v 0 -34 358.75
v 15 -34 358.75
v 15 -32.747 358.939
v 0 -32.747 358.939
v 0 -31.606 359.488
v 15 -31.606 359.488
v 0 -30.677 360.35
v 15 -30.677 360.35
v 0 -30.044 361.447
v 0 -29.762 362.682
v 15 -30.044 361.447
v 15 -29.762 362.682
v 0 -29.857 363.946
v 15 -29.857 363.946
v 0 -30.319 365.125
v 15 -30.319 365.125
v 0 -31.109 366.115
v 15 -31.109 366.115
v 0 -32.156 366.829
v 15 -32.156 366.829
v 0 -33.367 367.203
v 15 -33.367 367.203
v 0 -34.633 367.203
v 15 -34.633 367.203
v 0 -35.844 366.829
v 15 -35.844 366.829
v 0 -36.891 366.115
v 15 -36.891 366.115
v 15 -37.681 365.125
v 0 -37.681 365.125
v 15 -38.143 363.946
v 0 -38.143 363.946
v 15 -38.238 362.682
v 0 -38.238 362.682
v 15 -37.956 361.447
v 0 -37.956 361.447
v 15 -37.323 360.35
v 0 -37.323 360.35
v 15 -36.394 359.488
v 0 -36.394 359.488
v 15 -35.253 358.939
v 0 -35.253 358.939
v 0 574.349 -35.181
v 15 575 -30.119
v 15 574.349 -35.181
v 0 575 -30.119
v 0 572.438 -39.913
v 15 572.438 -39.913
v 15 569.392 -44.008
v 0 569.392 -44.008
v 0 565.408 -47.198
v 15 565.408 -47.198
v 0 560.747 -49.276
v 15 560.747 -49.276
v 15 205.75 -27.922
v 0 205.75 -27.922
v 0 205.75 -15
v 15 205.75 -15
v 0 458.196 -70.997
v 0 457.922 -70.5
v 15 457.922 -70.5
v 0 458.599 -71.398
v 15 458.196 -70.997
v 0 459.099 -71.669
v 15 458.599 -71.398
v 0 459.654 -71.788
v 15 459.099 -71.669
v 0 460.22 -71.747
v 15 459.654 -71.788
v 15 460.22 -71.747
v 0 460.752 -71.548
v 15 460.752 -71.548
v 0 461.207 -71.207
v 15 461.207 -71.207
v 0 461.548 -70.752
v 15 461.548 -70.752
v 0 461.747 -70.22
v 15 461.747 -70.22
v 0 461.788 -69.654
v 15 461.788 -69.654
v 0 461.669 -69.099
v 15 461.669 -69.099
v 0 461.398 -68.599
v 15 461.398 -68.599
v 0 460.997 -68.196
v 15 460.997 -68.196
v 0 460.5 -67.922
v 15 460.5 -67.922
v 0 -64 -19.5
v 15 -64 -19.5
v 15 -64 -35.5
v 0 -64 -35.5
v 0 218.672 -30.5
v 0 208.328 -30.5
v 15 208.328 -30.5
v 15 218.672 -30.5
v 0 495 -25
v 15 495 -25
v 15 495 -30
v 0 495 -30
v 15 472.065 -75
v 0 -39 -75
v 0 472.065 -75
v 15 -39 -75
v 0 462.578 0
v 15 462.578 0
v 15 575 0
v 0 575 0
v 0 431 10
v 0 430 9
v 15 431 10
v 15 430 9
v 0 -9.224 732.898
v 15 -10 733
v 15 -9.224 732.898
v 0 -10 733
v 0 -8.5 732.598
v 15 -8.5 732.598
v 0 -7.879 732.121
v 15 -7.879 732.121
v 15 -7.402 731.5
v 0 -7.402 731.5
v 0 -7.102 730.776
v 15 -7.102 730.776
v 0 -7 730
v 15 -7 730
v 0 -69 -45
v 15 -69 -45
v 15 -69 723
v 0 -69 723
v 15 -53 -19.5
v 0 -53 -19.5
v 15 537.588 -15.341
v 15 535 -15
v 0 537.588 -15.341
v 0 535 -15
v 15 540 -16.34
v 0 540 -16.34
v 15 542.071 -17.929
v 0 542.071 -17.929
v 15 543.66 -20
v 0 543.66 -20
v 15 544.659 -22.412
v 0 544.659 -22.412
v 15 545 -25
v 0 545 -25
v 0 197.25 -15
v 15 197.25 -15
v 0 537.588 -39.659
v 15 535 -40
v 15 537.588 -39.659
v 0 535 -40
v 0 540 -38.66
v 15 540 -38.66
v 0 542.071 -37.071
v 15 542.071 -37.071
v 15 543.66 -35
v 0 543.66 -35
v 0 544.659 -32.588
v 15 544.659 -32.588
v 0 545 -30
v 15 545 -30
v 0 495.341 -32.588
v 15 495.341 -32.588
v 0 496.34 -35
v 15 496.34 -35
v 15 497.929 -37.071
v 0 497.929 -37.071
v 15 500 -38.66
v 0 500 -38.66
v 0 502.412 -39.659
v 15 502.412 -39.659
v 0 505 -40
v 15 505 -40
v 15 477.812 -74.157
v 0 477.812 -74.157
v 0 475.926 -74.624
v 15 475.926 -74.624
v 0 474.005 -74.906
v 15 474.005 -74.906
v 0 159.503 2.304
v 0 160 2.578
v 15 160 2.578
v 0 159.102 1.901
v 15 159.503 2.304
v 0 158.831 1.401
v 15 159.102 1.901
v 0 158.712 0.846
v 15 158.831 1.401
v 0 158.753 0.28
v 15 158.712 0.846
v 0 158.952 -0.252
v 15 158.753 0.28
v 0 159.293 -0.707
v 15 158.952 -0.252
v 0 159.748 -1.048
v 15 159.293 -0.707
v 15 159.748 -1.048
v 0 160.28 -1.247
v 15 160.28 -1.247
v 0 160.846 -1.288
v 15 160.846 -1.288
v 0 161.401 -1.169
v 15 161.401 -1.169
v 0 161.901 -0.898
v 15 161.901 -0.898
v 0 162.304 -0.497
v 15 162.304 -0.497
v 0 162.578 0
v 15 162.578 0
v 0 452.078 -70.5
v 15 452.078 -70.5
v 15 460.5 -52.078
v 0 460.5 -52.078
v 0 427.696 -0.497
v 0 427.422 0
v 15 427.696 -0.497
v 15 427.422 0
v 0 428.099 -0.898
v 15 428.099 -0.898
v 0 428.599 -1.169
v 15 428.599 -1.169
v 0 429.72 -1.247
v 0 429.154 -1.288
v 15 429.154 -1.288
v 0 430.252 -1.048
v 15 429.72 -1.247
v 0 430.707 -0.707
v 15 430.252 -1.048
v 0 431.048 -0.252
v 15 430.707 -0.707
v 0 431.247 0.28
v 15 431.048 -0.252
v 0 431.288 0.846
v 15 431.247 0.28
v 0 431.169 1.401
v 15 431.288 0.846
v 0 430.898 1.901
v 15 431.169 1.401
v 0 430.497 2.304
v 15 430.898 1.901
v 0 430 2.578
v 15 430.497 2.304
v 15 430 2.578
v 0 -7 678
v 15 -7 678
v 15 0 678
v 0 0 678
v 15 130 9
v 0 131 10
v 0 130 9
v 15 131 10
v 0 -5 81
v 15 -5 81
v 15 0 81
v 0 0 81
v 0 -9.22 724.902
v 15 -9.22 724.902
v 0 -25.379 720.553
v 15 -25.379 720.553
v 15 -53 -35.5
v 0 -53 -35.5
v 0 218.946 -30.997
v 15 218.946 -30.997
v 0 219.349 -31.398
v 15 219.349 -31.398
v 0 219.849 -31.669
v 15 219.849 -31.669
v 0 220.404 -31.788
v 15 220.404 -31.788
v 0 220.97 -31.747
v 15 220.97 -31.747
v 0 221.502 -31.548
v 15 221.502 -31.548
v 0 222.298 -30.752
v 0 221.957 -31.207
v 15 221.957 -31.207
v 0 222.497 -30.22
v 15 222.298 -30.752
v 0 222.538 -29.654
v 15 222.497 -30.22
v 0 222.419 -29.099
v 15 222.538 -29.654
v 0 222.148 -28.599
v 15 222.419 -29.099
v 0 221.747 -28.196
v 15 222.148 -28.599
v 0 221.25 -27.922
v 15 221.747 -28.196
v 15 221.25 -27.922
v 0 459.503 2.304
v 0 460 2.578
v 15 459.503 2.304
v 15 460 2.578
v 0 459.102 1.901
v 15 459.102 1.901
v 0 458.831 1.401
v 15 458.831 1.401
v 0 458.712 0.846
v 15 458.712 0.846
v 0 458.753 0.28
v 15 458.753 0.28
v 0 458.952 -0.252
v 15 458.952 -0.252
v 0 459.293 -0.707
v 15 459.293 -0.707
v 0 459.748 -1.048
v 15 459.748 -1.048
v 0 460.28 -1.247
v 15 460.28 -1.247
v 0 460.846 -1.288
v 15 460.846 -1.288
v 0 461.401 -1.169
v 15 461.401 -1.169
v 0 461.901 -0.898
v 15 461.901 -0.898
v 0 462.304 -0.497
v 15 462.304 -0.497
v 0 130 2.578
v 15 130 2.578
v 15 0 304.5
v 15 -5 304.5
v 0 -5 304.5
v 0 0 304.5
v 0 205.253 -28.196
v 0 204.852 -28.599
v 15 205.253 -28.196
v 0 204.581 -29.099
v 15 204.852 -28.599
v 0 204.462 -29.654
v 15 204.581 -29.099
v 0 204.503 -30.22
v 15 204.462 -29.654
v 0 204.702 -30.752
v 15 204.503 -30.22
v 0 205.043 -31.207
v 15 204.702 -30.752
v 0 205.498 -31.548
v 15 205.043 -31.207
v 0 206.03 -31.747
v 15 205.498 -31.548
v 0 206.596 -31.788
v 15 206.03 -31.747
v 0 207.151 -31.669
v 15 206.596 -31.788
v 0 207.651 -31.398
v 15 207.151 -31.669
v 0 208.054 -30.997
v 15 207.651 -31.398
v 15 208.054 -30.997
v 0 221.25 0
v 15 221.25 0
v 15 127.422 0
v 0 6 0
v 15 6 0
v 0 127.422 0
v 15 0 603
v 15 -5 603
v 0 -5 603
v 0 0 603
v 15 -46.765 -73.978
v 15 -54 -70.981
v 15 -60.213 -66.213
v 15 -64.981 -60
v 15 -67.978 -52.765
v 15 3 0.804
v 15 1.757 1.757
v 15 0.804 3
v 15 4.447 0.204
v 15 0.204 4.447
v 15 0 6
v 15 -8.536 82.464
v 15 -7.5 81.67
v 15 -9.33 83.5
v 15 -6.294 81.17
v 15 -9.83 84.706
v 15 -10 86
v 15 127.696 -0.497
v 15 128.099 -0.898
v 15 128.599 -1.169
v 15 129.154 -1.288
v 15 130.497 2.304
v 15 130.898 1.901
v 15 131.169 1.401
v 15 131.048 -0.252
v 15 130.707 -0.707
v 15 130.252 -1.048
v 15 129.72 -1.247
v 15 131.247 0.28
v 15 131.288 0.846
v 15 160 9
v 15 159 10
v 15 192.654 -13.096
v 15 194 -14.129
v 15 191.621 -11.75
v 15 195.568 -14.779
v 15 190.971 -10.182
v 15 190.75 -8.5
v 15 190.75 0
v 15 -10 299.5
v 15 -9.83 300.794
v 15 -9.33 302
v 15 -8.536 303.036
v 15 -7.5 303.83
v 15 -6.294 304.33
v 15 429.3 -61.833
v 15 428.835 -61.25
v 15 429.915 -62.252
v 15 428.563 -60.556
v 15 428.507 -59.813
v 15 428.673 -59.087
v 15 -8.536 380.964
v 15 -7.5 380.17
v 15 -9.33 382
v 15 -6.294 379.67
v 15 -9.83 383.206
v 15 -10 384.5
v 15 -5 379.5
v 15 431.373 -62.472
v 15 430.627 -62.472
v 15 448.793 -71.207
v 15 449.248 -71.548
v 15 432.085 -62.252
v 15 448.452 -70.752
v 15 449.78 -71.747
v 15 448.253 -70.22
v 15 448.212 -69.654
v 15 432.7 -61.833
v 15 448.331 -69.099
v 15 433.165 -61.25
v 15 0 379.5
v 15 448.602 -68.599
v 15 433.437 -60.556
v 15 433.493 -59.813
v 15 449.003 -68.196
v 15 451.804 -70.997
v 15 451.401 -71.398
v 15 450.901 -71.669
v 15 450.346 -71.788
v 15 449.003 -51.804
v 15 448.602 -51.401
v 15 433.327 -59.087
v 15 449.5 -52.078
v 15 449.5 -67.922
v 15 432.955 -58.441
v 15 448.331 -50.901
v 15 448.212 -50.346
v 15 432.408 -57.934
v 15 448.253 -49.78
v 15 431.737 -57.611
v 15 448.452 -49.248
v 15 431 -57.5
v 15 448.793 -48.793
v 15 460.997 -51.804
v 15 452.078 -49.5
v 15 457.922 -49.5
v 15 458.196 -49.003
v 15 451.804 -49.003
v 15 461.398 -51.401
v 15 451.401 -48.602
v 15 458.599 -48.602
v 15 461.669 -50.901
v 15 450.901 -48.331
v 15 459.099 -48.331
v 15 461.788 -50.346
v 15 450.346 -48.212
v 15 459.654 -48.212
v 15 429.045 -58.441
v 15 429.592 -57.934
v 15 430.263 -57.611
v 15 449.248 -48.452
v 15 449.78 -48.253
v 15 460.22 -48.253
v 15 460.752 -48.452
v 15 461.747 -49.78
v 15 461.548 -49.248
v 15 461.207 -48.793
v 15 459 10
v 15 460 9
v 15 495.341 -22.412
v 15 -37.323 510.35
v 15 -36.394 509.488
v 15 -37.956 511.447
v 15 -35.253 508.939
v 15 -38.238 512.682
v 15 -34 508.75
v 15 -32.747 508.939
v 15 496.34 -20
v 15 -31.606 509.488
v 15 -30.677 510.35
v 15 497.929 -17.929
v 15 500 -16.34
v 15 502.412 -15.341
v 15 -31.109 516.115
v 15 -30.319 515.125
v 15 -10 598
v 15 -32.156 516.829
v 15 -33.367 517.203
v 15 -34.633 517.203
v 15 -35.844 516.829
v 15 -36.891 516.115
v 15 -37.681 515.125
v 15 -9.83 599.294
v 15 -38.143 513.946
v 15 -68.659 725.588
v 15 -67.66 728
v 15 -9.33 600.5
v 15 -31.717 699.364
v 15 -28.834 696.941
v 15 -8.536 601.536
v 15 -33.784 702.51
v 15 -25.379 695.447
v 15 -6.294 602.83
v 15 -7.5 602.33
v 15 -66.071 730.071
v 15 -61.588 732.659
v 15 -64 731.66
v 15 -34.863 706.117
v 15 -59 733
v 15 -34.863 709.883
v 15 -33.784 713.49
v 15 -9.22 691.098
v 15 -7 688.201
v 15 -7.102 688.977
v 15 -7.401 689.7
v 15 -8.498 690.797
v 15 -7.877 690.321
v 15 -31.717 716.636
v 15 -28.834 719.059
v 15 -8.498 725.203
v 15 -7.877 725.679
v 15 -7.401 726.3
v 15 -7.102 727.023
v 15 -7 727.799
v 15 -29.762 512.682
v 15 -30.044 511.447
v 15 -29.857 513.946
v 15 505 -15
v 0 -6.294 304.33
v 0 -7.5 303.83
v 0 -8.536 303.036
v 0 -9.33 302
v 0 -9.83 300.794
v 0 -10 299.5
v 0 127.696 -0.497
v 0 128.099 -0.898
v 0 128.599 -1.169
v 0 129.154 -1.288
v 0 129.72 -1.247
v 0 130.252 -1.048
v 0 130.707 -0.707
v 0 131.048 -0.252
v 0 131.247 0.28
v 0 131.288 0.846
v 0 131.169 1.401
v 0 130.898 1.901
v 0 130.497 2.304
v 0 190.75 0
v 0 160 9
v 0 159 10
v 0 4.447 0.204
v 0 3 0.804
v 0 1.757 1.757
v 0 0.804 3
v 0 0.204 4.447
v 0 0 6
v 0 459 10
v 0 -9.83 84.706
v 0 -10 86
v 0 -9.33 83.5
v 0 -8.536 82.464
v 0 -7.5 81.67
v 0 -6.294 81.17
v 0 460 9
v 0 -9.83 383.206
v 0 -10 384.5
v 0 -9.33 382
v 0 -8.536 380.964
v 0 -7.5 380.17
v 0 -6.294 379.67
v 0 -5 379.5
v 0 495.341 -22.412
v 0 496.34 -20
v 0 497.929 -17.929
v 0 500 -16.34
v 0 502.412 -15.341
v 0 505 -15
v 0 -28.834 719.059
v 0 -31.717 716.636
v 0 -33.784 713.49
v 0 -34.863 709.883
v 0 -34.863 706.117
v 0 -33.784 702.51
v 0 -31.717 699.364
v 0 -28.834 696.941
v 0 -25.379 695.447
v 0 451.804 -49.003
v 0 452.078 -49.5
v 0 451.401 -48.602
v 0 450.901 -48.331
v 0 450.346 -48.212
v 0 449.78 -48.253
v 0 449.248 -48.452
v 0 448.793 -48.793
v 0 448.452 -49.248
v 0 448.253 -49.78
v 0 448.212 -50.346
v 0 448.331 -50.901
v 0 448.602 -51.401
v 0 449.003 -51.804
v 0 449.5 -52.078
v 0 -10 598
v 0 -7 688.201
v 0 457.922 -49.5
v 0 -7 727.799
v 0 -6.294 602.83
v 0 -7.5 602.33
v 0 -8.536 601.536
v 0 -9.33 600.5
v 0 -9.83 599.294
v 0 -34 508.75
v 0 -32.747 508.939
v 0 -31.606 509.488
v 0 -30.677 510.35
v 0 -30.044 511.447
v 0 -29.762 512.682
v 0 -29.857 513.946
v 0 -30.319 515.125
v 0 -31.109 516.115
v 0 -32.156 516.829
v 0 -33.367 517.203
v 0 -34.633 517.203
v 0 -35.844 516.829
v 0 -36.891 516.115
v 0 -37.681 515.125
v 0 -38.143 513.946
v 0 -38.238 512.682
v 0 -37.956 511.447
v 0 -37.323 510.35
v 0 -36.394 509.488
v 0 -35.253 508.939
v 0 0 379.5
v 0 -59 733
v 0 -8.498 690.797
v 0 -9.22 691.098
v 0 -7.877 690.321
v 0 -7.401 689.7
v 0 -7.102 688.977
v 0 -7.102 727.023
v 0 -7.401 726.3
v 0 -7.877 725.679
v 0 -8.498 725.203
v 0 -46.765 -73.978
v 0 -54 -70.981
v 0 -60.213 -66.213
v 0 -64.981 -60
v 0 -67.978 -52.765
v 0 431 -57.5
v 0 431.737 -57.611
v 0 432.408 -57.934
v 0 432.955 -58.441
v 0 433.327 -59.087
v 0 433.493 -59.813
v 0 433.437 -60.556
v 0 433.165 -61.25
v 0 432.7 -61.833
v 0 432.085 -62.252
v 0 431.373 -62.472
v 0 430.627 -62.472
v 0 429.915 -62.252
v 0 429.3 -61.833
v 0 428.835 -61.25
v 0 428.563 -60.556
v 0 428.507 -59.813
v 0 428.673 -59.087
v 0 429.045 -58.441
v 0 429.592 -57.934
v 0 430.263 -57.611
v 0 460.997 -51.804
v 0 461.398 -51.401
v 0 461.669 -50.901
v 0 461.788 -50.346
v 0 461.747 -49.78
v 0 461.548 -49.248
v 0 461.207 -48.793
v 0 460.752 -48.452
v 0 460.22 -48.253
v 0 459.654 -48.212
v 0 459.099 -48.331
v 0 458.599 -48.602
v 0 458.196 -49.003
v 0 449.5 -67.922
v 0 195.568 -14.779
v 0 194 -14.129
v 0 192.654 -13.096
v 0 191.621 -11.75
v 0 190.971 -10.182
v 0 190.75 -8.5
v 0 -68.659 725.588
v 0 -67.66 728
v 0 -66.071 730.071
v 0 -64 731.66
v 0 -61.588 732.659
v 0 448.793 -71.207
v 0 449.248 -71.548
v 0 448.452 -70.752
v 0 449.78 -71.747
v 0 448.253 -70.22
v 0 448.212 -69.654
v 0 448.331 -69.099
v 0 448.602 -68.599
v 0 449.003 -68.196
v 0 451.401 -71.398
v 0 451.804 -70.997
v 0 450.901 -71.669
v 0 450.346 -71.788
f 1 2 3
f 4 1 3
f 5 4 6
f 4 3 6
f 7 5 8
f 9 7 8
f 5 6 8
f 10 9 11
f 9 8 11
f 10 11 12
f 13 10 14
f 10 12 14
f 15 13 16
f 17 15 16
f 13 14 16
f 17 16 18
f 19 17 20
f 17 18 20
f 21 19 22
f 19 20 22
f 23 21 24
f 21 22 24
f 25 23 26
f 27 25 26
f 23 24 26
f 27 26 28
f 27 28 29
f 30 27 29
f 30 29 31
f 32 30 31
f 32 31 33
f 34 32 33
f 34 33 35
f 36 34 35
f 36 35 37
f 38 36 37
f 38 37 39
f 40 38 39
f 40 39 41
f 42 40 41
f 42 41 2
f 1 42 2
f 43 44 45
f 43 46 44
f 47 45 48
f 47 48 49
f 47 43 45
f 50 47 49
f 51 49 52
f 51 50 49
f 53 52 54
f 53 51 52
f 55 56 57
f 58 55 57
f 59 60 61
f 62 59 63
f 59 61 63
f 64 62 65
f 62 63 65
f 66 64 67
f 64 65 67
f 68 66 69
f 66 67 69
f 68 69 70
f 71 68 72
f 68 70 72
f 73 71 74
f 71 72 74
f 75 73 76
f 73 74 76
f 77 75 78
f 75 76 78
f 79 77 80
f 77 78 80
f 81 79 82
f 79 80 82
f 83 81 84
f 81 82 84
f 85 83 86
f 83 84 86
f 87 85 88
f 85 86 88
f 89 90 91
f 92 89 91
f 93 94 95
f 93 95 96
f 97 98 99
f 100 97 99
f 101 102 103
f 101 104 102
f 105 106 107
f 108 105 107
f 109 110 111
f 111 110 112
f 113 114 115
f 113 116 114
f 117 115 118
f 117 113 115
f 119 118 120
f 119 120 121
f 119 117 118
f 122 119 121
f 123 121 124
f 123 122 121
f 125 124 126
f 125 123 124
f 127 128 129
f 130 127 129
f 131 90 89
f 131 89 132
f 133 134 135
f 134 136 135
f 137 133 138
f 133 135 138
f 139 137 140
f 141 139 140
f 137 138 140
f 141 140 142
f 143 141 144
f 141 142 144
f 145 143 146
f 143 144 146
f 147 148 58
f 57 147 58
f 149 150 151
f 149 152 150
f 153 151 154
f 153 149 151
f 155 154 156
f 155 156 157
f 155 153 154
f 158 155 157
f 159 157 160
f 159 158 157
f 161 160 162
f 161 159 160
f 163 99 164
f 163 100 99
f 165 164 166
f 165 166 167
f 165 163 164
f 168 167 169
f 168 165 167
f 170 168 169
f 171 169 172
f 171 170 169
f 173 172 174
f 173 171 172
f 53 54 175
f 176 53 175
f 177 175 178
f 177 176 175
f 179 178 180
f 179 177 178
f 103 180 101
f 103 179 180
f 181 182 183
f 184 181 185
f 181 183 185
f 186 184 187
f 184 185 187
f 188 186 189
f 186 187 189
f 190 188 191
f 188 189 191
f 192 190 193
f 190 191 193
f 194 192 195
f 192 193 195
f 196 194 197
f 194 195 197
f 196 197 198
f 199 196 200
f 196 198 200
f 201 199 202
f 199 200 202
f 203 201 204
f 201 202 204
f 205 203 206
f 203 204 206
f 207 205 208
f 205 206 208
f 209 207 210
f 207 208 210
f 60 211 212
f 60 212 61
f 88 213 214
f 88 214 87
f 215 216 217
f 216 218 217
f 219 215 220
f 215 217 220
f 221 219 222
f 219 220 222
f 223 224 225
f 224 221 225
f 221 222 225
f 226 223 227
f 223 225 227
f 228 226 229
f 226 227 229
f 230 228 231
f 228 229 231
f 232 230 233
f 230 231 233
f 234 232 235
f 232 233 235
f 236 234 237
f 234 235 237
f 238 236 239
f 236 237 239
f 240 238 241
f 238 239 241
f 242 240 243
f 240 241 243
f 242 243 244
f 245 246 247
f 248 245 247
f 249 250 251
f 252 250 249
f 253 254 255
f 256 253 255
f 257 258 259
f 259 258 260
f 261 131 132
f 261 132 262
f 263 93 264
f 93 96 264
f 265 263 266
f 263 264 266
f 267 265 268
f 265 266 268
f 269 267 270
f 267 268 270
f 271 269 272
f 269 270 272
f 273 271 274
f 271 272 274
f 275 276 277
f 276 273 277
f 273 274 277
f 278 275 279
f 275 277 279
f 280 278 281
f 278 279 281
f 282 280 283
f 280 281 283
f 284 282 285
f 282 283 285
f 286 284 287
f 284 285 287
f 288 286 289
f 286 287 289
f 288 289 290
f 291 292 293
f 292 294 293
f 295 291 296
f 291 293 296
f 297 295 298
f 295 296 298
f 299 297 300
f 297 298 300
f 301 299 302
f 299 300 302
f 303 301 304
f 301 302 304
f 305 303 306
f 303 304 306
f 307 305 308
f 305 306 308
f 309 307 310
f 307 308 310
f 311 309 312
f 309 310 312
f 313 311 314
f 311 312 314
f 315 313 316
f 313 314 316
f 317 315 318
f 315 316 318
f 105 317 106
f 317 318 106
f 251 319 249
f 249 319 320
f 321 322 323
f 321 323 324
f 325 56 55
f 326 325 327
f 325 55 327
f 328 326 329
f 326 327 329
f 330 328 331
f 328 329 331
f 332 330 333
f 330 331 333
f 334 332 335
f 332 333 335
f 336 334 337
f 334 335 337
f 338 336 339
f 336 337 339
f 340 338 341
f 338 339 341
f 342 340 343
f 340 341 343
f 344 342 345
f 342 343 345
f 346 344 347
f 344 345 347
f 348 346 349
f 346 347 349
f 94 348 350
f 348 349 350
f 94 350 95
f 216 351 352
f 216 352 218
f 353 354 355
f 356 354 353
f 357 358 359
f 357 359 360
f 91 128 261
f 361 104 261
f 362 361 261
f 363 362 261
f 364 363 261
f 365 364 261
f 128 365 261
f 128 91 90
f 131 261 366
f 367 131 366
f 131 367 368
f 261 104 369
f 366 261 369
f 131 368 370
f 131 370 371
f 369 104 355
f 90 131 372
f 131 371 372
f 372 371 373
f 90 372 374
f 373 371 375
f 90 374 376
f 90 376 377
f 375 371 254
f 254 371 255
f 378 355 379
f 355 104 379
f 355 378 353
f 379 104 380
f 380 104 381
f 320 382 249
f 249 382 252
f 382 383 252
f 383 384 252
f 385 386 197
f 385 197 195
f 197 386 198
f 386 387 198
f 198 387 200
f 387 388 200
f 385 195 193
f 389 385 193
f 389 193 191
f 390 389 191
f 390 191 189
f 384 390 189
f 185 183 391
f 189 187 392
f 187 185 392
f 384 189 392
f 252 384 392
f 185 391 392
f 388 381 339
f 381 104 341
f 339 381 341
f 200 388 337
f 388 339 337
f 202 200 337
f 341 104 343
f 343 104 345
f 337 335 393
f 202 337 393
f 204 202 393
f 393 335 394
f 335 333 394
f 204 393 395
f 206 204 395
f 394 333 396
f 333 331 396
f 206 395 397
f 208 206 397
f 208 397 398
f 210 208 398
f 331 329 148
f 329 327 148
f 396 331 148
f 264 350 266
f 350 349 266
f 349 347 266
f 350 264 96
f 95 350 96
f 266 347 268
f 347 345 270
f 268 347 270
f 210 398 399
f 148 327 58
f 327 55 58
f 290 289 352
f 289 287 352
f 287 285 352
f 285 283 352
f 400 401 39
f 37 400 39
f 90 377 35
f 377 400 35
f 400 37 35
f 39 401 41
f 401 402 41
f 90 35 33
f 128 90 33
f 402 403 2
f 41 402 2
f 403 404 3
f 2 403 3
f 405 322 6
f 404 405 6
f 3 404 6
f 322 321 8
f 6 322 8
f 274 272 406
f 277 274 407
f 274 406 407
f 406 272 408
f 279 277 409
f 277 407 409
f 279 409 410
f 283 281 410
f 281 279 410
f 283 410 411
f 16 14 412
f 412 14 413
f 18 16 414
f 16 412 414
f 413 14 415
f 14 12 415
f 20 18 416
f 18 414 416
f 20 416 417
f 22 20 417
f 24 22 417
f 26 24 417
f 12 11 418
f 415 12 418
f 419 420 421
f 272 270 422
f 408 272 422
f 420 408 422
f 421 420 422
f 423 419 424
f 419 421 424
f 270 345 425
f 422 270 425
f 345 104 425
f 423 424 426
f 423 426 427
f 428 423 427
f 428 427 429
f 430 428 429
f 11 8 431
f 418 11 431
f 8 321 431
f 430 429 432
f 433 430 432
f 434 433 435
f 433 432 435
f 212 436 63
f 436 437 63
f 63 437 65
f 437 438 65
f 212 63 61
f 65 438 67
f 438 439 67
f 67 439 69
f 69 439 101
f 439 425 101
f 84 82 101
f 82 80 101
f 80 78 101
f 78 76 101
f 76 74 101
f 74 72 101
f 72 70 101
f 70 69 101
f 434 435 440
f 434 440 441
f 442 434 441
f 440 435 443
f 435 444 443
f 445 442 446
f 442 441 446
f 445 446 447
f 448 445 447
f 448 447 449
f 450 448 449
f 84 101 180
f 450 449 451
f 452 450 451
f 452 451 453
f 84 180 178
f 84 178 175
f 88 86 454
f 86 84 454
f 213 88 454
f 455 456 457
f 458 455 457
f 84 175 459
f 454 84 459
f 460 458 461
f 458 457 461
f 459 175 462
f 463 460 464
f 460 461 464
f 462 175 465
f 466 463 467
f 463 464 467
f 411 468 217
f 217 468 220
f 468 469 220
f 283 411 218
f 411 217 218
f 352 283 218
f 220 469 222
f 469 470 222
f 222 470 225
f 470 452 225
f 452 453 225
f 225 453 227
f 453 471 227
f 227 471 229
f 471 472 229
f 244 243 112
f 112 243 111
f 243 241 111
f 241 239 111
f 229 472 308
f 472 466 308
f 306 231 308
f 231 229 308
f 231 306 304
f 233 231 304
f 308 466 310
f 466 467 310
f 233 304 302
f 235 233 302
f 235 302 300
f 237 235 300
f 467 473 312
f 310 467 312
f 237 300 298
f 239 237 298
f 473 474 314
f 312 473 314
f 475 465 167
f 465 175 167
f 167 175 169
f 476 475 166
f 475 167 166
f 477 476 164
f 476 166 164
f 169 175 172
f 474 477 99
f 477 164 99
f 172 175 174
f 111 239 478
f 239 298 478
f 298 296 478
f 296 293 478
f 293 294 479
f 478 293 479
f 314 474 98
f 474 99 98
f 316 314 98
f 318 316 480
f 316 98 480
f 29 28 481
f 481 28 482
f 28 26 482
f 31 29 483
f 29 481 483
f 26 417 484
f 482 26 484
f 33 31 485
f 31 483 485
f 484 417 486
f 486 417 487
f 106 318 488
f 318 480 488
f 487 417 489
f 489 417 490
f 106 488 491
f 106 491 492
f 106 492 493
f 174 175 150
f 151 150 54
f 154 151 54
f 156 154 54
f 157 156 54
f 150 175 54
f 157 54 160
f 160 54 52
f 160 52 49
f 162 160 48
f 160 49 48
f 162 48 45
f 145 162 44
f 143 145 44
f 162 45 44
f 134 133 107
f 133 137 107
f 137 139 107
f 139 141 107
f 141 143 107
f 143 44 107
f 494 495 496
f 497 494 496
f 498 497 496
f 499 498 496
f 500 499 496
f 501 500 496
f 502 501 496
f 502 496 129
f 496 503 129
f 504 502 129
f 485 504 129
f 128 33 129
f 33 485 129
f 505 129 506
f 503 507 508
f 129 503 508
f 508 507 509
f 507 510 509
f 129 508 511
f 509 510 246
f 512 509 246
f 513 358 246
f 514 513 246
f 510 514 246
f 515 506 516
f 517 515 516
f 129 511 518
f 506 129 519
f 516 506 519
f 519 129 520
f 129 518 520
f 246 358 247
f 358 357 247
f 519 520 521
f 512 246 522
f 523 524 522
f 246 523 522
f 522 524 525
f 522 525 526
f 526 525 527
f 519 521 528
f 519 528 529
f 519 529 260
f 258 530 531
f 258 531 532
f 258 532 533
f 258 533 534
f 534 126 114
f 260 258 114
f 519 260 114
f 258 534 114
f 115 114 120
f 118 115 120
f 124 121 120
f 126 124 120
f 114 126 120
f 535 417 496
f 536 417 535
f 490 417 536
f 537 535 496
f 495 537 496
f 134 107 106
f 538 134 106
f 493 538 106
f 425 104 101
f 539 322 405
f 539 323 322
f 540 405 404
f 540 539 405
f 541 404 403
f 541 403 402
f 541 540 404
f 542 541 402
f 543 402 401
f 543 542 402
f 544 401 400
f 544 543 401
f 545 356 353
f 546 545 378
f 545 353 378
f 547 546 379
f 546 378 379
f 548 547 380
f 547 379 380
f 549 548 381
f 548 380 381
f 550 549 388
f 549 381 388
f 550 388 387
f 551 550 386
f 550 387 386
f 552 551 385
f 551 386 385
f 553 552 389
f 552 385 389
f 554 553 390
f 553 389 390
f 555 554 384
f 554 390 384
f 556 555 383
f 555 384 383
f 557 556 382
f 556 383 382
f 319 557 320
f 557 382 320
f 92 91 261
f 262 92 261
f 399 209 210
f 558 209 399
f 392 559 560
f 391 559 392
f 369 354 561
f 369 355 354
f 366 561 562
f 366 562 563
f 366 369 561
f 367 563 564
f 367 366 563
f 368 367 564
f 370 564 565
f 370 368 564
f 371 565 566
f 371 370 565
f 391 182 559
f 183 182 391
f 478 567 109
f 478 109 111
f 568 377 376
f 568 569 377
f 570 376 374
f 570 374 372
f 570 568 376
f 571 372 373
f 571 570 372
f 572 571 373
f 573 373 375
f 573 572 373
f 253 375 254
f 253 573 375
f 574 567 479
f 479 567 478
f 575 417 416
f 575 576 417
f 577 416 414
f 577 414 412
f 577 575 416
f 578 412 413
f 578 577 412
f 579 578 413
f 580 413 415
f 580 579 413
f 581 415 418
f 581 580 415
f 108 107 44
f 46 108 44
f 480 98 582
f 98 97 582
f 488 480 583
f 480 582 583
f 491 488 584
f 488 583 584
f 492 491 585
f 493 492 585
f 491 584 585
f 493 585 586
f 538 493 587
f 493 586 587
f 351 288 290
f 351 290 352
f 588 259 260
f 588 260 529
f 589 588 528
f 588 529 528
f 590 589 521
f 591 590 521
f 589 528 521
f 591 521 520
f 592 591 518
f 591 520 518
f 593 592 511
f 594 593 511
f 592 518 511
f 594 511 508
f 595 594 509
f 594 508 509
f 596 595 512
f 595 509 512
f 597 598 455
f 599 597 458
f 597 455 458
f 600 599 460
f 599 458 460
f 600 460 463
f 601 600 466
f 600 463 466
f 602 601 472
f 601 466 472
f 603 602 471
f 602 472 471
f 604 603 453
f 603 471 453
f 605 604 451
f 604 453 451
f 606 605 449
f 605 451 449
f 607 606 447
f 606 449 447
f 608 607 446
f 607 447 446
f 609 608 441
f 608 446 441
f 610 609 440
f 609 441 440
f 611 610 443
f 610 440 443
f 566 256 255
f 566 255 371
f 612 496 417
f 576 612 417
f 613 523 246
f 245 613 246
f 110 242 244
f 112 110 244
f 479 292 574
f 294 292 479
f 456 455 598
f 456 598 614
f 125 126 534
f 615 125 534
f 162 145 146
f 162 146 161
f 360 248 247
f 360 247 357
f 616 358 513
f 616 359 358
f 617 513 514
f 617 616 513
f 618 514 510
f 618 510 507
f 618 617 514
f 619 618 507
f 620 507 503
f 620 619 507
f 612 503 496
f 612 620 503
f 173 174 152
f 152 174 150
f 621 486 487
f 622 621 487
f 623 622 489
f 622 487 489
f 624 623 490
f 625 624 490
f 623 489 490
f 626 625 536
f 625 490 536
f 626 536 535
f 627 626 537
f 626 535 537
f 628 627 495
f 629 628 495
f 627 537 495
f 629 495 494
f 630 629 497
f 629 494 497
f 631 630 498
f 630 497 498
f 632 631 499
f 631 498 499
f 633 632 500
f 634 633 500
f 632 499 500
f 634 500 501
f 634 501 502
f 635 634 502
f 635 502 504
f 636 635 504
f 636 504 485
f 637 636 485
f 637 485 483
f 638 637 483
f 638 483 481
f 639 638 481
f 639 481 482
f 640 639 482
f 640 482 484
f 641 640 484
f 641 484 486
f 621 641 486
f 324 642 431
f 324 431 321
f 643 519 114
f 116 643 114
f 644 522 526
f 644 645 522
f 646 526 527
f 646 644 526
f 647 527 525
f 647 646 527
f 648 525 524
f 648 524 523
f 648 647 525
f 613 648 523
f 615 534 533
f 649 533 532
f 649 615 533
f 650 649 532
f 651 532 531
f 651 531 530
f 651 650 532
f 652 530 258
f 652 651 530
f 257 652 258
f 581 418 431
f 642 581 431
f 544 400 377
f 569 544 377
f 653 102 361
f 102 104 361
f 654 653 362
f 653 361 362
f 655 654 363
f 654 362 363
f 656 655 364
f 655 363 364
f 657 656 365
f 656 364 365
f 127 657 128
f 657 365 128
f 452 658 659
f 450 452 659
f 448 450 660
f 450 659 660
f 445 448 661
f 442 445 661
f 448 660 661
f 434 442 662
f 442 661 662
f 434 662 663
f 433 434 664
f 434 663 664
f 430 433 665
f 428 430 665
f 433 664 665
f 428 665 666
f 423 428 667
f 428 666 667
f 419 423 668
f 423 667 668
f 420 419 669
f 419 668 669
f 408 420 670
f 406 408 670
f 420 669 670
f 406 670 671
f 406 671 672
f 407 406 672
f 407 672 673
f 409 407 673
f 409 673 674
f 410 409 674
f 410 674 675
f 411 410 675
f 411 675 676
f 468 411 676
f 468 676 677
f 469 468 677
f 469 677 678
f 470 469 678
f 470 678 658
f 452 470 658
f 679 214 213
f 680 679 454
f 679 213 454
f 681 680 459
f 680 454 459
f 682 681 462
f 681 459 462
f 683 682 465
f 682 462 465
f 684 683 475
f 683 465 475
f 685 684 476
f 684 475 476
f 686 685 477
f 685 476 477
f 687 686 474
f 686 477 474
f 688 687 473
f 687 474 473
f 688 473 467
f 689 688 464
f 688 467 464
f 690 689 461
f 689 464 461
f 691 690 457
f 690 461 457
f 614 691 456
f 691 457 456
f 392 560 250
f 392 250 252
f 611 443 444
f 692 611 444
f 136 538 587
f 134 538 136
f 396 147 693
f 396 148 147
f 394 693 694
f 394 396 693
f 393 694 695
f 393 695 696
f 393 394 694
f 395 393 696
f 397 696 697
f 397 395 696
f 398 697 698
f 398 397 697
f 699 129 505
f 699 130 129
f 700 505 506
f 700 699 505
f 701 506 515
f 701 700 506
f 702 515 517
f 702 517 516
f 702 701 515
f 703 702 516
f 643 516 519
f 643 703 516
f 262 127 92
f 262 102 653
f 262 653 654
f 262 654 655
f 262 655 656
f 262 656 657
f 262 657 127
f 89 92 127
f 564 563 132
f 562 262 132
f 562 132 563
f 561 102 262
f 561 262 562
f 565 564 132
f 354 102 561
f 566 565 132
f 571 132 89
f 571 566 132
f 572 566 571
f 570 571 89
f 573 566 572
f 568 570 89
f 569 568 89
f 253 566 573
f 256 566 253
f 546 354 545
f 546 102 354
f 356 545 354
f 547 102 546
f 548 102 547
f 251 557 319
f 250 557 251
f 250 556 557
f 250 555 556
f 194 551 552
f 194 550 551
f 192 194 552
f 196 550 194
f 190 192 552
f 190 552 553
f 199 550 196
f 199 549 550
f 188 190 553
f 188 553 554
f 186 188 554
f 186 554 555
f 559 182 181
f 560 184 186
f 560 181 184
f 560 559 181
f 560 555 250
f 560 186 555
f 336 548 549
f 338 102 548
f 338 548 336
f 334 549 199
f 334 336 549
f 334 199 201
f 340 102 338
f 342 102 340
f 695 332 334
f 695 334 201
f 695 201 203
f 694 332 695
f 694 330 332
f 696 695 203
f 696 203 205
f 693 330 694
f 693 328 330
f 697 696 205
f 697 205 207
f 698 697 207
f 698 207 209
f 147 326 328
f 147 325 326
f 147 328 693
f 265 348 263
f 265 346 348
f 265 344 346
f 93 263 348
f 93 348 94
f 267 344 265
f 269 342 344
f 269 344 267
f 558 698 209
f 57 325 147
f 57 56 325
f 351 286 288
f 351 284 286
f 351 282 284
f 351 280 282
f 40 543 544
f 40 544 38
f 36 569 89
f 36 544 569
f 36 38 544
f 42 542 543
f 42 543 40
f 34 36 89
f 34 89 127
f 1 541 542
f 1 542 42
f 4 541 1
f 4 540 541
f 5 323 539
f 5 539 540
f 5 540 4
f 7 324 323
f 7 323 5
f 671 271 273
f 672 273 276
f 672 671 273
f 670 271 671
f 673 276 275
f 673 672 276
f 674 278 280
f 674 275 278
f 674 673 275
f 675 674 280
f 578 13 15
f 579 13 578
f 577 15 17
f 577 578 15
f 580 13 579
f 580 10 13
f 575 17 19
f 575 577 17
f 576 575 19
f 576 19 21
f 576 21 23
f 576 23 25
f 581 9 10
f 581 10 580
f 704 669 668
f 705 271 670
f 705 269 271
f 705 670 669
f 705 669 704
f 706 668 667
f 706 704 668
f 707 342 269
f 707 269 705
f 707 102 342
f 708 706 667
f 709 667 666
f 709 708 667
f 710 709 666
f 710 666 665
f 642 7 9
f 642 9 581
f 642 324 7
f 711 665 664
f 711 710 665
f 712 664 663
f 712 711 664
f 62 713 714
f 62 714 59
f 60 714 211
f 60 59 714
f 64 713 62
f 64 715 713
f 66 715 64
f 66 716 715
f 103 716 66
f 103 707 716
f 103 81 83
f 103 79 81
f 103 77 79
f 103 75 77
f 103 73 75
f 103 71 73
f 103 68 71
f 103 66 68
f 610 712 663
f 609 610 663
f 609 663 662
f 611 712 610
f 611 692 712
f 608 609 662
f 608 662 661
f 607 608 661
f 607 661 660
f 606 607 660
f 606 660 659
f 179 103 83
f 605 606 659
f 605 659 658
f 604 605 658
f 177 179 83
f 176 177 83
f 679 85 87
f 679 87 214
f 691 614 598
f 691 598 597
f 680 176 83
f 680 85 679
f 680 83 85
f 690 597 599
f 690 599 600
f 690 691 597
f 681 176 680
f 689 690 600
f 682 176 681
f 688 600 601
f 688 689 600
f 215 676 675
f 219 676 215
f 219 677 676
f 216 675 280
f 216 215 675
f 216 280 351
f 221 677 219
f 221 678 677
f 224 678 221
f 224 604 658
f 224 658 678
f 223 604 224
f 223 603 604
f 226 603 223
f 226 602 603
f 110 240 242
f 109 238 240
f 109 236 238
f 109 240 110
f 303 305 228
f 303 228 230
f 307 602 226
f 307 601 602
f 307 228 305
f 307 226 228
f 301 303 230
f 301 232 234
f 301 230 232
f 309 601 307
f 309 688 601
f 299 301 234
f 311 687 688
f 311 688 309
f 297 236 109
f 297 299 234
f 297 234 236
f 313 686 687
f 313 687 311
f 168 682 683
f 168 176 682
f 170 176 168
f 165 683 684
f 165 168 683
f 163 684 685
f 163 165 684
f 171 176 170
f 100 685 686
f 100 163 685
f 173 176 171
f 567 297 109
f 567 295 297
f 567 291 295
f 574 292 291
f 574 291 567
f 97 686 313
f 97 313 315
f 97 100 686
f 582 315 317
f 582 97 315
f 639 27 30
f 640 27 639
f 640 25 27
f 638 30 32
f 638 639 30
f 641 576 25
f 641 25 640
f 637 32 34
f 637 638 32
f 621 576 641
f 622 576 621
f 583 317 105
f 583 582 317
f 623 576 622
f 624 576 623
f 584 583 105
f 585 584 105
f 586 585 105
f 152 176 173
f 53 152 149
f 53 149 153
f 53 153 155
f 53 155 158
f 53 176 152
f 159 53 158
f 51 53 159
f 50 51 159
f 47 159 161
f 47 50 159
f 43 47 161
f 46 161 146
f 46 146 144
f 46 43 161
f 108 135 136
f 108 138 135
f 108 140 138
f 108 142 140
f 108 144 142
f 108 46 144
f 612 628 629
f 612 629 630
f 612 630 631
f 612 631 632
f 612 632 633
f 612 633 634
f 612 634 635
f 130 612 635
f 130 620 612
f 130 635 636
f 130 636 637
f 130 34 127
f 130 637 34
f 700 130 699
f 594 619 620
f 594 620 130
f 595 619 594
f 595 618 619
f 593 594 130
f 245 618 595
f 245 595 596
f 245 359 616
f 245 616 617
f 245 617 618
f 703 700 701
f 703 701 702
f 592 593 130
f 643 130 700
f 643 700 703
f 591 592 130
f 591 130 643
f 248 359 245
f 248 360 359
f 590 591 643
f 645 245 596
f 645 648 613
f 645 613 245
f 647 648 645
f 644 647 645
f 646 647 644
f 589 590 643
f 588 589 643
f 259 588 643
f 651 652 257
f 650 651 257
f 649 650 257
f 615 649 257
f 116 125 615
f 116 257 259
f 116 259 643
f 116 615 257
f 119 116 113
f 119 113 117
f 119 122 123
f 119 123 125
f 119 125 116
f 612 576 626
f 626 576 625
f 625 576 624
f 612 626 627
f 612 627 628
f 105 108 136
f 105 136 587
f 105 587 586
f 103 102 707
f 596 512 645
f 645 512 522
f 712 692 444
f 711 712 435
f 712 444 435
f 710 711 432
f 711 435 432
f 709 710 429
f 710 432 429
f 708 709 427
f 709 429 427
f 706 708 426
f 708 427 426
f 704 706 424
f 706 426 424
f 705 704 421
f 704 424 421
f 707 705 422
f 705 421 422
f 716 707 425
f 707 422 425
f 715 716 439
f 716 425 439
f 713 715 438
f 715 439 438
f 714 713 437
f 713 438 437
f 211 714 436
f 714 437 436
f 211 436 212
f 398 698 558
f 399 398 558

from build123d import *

# Parameters (mm, degrees)
BOSS_EXTRUDE1_DEPTH = 15
FILLET1_R           = 30
FILLET2_R           = 6
SKETCH3_W           = 30.5
SKETCH3_H           = 15.5
CUT_EXTRUDE2_DEPTH  = 820.456527218
SKETCH6_W           = 15
SKETCH6_H           = 30
BOSS_EXTRUDE2_DEPTH = 10
SKETCH7_W           = 15
SKETCH7_H           = 15
CUT_EXTRUDE5_DEPTH  = 820.456527218
FILLET4_R           = 6.5
SKETCH9_W           = 75
SKETCH9_H           = 115
BOSS_EXTRUDE3_DEPTH = 15
SKETCH8_W           = 21
SKETCH8_H           = 11
CUT_EXTRUDE6_DEPTH  = 890.119789455
CUT_EXTRUDE7_DEPTH  = 15
SKETCH11_W          = 25
SKETCH11_H          = 50
CUT_EXTRUDE8_DEPTH  = 15
SKETCH5_R           = 2.5
CUT_EXTRUDE4_DEPTH  = 890.119789455
FILLET5_R           = 20
FILLET6_R           = 10
CHAMFER1_SIZE       = 1
SKETCH12_W          = 16
SKETCH12_H          = 11
CUT_EXTRUDE9_DEPTH  = 890.119789455
SKETCH14_W          = 223.5
SKETCH14_H          = 10
CUT_EXTRUDE11_DEPTH = 15
FILLET8_R           = 5
SKETCH15_R          = 2
CUT_EXTRUDE12_DEPTH = 890.119789455
SKETCH16_R          = 2
CUT_EXTRUDE13_DEPTH = 890.119789455
SKETCH17_R          = 2
CUT_EXTRUDE14_DEPTH = 890.119789455
BOSS_EXTRUDE4_DEPTH = 15
FILLET9_R           = 10
FILLET10_R          = 3
SKETCH19_R          = 4.25
CUT_EXTRUDE15_DEPTH = 932.739770537


with BuildPart() as part:
    # Sketch1 → Boss-Extrude1 (new body)
    with BuildSketch(Plane(origin=(0, 0, 0), x_dir=(0, 0, -1), z_dir=(1, 0, 0))):
        Polygon((-678, 0), (0, 0), (0, 460), (75, 460), (75, -69), (-678, -69), align=None)
    extrude(amount=BOSS_EXTRUDE1_DEPTH)

    # Fillet1
    fillet1_edges = [part.edges().sort_by_distance(p)[0] for p in [
        (7.5, -69, -75),
    ]]
    fillet(fillet1_edges, radius=FILLET1_R)

    # Fillet2
    fillet2_edges = [part.edges().sort_by_distance(p)[0] for p in [
        (7.5, 0, 0),
    ]]
    fillet(fillet2_edges, radius=FILLET2_R)

    # Sketch3 → Cut-Extrude2 (cut, through all)
    with BuildSketch(Plane.ZY):
        with Locations((-15.25, 213.5)):
            Rectangle(SKETCH3_W, SKETCH3_H)
    extrude(amount=-CUT_EXTRUDE2_DEPTH, mode=Mode.SUBTRACT)

    # Sketch6 → Boss-Extrude2 (add)
    with BuildSketch(Plane.XY):
        with Locations((7.5, 445)):
            Rectangle(SKETCH6_W, SKETCH6_H)
        with Locations((7.5, 145)):
            Rectangle(SKETCH6_W, SKETCH6_H)
    extrude(amount=BOSS_EXTRUDE2_DEPTH)

    # Sketch7 → Cut-Extrude5 (cut, through all)
    with BuildSketch(Plane.ZY):
        with Locations((-7.5, 198.25)):
            Rectangle(SKETCH7_W, SKETCH7_H)
    extrude(amount=-CUT_EXTRUDE5_DEPTH, mode=Mode.SUBTRACT)

    # Fillet4
    fillet4_edges = [part.edges().sort_by_distance(p)[0] for p in [
        (7.5, 190.75, -15),
    ]]
    fillet(fillet4_edges, radius=FILLET4_R)

    # Sketch9 → Boss-Extrude3 (add)
    with BuildSketch(Plane(origin=(15, 0, 0), x_dir=(0, 0, -1), z_dir=(1, 0, 0))):
        with Locations((37.5, 517.5)):
            Rectangle(SKETCH9_W, SKETCH9_H)
    extrude(amount=-BOSS_EXTRUDE3_DEPTH)

    # Sketch8 → Cut-Extrude6 (cut, through all)
    with BuildSketch(Plane(origin=(15, 0, 0), x_dir=(0, 0, -1), z_dir=(1, 0, 0))):
        with Locations((60, 455)):
            Rectangle(SKETCH8_W, SKETCH8_H)
    extrude(amount=-CUT_EXTRUDE6_DEPTH, mode=Mode.SUBTRACT)

    # Sketch10 → Cut-Extrude7 (cut)
    with BuildSketch(Plane(origin=(15, 0, 0), x_dir=(0, 0, -1), z_dir=(1, 0, 0))):
        Polygon((45, 575), (75, 475), (75, 575), align=None)
    extrude(amount=-CUT_EXTRUDE7_DEPTH, mode=Mode.SUBTRACT)

    # Sketch11 → Cut-Extrude8 (cut)
    with BuildSketch(Plane(origin=(15, 0, 0), x_dir=(0, 0, -1), z_dir=(1, 0, 0))):
        with Locations((27.5, 520)):
            Rectangle(SKETCH11_W, SKETCH11_H)
    extrude(amount=-CUT_EXTRUDE8_DEPTH, mode=Mode.SUBTRACT)

    # Sketch5 → Cut-Extrude4 (cut, through all)
    with BuildSketch(Plane.ZY):
        with Locations((-60, 431)):
            Circle(SKETCH5_R)
    extrude(amount=-CUT_EXTRUDE4_DEPTH, mode=Mode.SUBTRACT)

    # Fillet5
    fillet5_edges = [part.edges().sort_by_distance(p)[0] for p in [
        (7.5, 575, -45),
        (7.5, 475, -75),
    ]]
    fillet(fillet5_edges, radius=FILLET5_R)

    # Fillet6
    fillet6_edges = [part.edges().sort_by_distance(p)[0] for p in [
        (7.5, 495, -15),
        (7.5, 545, -15),
        (7.5, 545, -40),
        (7.5, 495, -40),
    ]]
    fillet(fillet6_edges, radius=FILLET6_R)

    # Chamfer1
    chamfer1_edges = [part.edges().sort_by_distance(p)[0] for p in [
        (7.5, 430, 10),
        (7.5, 460, 10),
        (7.5, 130, 10),
        (7.5, 160, 10),
    ]]
    chamfer(chamfer1_edges, length=CHAMFER1_SIZE)

    # Sketch12 → Cut-Extrude9 (cut, through all)
    with BuildSketch(Plane(origin=(15, 0, 0), x_dir=(0, 0, -1), z_dir=(1, 0, 0))):
        with Locations((27.5, -58.5)):
            Rectangle(SKETCH12_W, SKETCH12_H)
    extrude(amount=-CUT_EXTRUDE9_DEPTH, mode=Mode.SUBTRACT)

    # Sketch14 → Cut-Extrude11 (cut)
    with BuildSketch(Plane(origin=(15, 0, 0), x_dir=(0, 0, -1), z_dir=(1, 0, 0))):
        with Locations((-491.25, -5)):
            Rectangle(SKETCH14_W, SKETCH14_H)
        with Locations((-192.75, -5)):
            Rectangle(SKETCH14_W, SKETCH14_H)
    extrude(amount=-CUT_EXTRUDE11_DEPTH, mode=Mode.SUBTRACT)

    # Fillet8
    fillet8_edges = [part.edges().sort_by_distance(p)[0] for p in [
        (7.5, -10, 603),
        (7.5, -10, 379.5),
        (7.5, -10, 81),
        (7.5, -10, 304.5),
    ]]
    fillet(fillet8_edges, radius=FILLET8_R)

    # Sketch15 → Cut-Extrude12 (cut, through all)
    with BuildSketch(Plane(origin=(15, 0, 0), x_dir=(0, 0, -1), z_dir=(1, 0, 0))):
        with Locations((-0.707106781, 129.292893219)):
            Circle(SKETCH15_R)
        with Locations((-0.707106781, 160.707106781)):
            Circle(SKETCH15_R)
        with Locations((-0.707106781, 429.292893219)):
            Circle(SKETCH15_R)
        with Locations((-0.707106781, 460.707106781)):
            Circle(SKETCH15_R)
    extrude(amount=-CUT_EXTRUDE12_DEPTH, mode=Mode.SUBTRACT)

    # Sketch16 → Cut-Extrude13 (cut, through all)
    with BuildSketch(Plane(origin=(15, 0, 0), x_dir=(0, 0, -1), z_dir=(1, 0, 0))):
        with Locations((50.207106781, 450.207106781)):
            Circle(SKETCH16_R)
        with Locations((50.207106781, 459.792893219)):
            Circle(SKETCH16_R)
        with Locations((69.792893219, 459.792893219)):
            Circle(SKETCH16_R)
        with Locations((69.792893219, 450.207106781)):
            Circle(SKETCH16_R)
    extrude(amount=-CUT_EXTRUDE13_DEPTH, mode=Mode.SUBTRACT)

    # Sketch17 → Cut-Extrude14 (cut, through all)
    with BuildSketch(Plane(origin=(15, 0, 0), x_dir=(0, 0, -1), z_dir=(1, 0, 0))):
        with Locations((29.792893219, 206.457106781)):
            Circle(SKETCH17_R)
        with Locations((29.792893219, 220.542893219)):
            Circle(SKETCH17_R)
    extrude(amount=-CUT_EXTRUDE14_DEPTH, mode=Mode.SUBTRACT)

    # Sketch18 → Boss-Extrude4 (add)
    with BuildSketch(Plane(origin=(15, 0, 0), x_dir=(0, 0, -1), z_dir=(1, 0, 0))):
        with BuildLine():
            Line((-678, -69), (-733, -69))
            Line((-733, -69), (-733, -7))
            Line((-733, -7), (-725.5, -7))
            Line((-725.5, -7), (-720.55324034, -25.378780397))
            ThreePointArc((-720.55324034, -25.378780397), (-708, -35), (-695.44675966, -25.378780397))
            Line((-695.44675966, -25.378780397), (-690.5, -7))
            Line((-690.5, -7), (-678, -7))
            Line((-678, -7), (-678, -69))
        make_face()
    extrude(amount=-BOSS_EXTRUDE4_DEPTH)

    # Fillet9
    fillet9_edges = [part.edges().sort_by_distance(p)[0] for p in [
        (7.5, -69, 733),
    ]]
    fillet(fillet9_edges, radius=FILLET9_R)

    # Fillet10
    fillet10_edges = [part.edges().sort_by_distance(p)[0] for p in [
        (7.5, -7, 733),
        (7.5, -7, 725.5),
        (7.5, -7, 690.5),
    ]]
    fillet(fillet10_edges, radius=FILLET10_R)

    # Sketch19 → Cut-Extrude15 (cut, through all)
    with BuildSketch(Plane(origin=(15, 0, 0), x_dir=(0, 0, -1), z_dir=(1, 0, 0))):
        with Locations((-513, -34)):
            Circle(SKETCH19_R)
        with Locations((-363, -34)):
            Circle(SKETCH19_R)
    extrude(amount=-CUT_EXTRUDE15_DEPTH, mode=Mode.SUBTRACT)


solid = part.part
